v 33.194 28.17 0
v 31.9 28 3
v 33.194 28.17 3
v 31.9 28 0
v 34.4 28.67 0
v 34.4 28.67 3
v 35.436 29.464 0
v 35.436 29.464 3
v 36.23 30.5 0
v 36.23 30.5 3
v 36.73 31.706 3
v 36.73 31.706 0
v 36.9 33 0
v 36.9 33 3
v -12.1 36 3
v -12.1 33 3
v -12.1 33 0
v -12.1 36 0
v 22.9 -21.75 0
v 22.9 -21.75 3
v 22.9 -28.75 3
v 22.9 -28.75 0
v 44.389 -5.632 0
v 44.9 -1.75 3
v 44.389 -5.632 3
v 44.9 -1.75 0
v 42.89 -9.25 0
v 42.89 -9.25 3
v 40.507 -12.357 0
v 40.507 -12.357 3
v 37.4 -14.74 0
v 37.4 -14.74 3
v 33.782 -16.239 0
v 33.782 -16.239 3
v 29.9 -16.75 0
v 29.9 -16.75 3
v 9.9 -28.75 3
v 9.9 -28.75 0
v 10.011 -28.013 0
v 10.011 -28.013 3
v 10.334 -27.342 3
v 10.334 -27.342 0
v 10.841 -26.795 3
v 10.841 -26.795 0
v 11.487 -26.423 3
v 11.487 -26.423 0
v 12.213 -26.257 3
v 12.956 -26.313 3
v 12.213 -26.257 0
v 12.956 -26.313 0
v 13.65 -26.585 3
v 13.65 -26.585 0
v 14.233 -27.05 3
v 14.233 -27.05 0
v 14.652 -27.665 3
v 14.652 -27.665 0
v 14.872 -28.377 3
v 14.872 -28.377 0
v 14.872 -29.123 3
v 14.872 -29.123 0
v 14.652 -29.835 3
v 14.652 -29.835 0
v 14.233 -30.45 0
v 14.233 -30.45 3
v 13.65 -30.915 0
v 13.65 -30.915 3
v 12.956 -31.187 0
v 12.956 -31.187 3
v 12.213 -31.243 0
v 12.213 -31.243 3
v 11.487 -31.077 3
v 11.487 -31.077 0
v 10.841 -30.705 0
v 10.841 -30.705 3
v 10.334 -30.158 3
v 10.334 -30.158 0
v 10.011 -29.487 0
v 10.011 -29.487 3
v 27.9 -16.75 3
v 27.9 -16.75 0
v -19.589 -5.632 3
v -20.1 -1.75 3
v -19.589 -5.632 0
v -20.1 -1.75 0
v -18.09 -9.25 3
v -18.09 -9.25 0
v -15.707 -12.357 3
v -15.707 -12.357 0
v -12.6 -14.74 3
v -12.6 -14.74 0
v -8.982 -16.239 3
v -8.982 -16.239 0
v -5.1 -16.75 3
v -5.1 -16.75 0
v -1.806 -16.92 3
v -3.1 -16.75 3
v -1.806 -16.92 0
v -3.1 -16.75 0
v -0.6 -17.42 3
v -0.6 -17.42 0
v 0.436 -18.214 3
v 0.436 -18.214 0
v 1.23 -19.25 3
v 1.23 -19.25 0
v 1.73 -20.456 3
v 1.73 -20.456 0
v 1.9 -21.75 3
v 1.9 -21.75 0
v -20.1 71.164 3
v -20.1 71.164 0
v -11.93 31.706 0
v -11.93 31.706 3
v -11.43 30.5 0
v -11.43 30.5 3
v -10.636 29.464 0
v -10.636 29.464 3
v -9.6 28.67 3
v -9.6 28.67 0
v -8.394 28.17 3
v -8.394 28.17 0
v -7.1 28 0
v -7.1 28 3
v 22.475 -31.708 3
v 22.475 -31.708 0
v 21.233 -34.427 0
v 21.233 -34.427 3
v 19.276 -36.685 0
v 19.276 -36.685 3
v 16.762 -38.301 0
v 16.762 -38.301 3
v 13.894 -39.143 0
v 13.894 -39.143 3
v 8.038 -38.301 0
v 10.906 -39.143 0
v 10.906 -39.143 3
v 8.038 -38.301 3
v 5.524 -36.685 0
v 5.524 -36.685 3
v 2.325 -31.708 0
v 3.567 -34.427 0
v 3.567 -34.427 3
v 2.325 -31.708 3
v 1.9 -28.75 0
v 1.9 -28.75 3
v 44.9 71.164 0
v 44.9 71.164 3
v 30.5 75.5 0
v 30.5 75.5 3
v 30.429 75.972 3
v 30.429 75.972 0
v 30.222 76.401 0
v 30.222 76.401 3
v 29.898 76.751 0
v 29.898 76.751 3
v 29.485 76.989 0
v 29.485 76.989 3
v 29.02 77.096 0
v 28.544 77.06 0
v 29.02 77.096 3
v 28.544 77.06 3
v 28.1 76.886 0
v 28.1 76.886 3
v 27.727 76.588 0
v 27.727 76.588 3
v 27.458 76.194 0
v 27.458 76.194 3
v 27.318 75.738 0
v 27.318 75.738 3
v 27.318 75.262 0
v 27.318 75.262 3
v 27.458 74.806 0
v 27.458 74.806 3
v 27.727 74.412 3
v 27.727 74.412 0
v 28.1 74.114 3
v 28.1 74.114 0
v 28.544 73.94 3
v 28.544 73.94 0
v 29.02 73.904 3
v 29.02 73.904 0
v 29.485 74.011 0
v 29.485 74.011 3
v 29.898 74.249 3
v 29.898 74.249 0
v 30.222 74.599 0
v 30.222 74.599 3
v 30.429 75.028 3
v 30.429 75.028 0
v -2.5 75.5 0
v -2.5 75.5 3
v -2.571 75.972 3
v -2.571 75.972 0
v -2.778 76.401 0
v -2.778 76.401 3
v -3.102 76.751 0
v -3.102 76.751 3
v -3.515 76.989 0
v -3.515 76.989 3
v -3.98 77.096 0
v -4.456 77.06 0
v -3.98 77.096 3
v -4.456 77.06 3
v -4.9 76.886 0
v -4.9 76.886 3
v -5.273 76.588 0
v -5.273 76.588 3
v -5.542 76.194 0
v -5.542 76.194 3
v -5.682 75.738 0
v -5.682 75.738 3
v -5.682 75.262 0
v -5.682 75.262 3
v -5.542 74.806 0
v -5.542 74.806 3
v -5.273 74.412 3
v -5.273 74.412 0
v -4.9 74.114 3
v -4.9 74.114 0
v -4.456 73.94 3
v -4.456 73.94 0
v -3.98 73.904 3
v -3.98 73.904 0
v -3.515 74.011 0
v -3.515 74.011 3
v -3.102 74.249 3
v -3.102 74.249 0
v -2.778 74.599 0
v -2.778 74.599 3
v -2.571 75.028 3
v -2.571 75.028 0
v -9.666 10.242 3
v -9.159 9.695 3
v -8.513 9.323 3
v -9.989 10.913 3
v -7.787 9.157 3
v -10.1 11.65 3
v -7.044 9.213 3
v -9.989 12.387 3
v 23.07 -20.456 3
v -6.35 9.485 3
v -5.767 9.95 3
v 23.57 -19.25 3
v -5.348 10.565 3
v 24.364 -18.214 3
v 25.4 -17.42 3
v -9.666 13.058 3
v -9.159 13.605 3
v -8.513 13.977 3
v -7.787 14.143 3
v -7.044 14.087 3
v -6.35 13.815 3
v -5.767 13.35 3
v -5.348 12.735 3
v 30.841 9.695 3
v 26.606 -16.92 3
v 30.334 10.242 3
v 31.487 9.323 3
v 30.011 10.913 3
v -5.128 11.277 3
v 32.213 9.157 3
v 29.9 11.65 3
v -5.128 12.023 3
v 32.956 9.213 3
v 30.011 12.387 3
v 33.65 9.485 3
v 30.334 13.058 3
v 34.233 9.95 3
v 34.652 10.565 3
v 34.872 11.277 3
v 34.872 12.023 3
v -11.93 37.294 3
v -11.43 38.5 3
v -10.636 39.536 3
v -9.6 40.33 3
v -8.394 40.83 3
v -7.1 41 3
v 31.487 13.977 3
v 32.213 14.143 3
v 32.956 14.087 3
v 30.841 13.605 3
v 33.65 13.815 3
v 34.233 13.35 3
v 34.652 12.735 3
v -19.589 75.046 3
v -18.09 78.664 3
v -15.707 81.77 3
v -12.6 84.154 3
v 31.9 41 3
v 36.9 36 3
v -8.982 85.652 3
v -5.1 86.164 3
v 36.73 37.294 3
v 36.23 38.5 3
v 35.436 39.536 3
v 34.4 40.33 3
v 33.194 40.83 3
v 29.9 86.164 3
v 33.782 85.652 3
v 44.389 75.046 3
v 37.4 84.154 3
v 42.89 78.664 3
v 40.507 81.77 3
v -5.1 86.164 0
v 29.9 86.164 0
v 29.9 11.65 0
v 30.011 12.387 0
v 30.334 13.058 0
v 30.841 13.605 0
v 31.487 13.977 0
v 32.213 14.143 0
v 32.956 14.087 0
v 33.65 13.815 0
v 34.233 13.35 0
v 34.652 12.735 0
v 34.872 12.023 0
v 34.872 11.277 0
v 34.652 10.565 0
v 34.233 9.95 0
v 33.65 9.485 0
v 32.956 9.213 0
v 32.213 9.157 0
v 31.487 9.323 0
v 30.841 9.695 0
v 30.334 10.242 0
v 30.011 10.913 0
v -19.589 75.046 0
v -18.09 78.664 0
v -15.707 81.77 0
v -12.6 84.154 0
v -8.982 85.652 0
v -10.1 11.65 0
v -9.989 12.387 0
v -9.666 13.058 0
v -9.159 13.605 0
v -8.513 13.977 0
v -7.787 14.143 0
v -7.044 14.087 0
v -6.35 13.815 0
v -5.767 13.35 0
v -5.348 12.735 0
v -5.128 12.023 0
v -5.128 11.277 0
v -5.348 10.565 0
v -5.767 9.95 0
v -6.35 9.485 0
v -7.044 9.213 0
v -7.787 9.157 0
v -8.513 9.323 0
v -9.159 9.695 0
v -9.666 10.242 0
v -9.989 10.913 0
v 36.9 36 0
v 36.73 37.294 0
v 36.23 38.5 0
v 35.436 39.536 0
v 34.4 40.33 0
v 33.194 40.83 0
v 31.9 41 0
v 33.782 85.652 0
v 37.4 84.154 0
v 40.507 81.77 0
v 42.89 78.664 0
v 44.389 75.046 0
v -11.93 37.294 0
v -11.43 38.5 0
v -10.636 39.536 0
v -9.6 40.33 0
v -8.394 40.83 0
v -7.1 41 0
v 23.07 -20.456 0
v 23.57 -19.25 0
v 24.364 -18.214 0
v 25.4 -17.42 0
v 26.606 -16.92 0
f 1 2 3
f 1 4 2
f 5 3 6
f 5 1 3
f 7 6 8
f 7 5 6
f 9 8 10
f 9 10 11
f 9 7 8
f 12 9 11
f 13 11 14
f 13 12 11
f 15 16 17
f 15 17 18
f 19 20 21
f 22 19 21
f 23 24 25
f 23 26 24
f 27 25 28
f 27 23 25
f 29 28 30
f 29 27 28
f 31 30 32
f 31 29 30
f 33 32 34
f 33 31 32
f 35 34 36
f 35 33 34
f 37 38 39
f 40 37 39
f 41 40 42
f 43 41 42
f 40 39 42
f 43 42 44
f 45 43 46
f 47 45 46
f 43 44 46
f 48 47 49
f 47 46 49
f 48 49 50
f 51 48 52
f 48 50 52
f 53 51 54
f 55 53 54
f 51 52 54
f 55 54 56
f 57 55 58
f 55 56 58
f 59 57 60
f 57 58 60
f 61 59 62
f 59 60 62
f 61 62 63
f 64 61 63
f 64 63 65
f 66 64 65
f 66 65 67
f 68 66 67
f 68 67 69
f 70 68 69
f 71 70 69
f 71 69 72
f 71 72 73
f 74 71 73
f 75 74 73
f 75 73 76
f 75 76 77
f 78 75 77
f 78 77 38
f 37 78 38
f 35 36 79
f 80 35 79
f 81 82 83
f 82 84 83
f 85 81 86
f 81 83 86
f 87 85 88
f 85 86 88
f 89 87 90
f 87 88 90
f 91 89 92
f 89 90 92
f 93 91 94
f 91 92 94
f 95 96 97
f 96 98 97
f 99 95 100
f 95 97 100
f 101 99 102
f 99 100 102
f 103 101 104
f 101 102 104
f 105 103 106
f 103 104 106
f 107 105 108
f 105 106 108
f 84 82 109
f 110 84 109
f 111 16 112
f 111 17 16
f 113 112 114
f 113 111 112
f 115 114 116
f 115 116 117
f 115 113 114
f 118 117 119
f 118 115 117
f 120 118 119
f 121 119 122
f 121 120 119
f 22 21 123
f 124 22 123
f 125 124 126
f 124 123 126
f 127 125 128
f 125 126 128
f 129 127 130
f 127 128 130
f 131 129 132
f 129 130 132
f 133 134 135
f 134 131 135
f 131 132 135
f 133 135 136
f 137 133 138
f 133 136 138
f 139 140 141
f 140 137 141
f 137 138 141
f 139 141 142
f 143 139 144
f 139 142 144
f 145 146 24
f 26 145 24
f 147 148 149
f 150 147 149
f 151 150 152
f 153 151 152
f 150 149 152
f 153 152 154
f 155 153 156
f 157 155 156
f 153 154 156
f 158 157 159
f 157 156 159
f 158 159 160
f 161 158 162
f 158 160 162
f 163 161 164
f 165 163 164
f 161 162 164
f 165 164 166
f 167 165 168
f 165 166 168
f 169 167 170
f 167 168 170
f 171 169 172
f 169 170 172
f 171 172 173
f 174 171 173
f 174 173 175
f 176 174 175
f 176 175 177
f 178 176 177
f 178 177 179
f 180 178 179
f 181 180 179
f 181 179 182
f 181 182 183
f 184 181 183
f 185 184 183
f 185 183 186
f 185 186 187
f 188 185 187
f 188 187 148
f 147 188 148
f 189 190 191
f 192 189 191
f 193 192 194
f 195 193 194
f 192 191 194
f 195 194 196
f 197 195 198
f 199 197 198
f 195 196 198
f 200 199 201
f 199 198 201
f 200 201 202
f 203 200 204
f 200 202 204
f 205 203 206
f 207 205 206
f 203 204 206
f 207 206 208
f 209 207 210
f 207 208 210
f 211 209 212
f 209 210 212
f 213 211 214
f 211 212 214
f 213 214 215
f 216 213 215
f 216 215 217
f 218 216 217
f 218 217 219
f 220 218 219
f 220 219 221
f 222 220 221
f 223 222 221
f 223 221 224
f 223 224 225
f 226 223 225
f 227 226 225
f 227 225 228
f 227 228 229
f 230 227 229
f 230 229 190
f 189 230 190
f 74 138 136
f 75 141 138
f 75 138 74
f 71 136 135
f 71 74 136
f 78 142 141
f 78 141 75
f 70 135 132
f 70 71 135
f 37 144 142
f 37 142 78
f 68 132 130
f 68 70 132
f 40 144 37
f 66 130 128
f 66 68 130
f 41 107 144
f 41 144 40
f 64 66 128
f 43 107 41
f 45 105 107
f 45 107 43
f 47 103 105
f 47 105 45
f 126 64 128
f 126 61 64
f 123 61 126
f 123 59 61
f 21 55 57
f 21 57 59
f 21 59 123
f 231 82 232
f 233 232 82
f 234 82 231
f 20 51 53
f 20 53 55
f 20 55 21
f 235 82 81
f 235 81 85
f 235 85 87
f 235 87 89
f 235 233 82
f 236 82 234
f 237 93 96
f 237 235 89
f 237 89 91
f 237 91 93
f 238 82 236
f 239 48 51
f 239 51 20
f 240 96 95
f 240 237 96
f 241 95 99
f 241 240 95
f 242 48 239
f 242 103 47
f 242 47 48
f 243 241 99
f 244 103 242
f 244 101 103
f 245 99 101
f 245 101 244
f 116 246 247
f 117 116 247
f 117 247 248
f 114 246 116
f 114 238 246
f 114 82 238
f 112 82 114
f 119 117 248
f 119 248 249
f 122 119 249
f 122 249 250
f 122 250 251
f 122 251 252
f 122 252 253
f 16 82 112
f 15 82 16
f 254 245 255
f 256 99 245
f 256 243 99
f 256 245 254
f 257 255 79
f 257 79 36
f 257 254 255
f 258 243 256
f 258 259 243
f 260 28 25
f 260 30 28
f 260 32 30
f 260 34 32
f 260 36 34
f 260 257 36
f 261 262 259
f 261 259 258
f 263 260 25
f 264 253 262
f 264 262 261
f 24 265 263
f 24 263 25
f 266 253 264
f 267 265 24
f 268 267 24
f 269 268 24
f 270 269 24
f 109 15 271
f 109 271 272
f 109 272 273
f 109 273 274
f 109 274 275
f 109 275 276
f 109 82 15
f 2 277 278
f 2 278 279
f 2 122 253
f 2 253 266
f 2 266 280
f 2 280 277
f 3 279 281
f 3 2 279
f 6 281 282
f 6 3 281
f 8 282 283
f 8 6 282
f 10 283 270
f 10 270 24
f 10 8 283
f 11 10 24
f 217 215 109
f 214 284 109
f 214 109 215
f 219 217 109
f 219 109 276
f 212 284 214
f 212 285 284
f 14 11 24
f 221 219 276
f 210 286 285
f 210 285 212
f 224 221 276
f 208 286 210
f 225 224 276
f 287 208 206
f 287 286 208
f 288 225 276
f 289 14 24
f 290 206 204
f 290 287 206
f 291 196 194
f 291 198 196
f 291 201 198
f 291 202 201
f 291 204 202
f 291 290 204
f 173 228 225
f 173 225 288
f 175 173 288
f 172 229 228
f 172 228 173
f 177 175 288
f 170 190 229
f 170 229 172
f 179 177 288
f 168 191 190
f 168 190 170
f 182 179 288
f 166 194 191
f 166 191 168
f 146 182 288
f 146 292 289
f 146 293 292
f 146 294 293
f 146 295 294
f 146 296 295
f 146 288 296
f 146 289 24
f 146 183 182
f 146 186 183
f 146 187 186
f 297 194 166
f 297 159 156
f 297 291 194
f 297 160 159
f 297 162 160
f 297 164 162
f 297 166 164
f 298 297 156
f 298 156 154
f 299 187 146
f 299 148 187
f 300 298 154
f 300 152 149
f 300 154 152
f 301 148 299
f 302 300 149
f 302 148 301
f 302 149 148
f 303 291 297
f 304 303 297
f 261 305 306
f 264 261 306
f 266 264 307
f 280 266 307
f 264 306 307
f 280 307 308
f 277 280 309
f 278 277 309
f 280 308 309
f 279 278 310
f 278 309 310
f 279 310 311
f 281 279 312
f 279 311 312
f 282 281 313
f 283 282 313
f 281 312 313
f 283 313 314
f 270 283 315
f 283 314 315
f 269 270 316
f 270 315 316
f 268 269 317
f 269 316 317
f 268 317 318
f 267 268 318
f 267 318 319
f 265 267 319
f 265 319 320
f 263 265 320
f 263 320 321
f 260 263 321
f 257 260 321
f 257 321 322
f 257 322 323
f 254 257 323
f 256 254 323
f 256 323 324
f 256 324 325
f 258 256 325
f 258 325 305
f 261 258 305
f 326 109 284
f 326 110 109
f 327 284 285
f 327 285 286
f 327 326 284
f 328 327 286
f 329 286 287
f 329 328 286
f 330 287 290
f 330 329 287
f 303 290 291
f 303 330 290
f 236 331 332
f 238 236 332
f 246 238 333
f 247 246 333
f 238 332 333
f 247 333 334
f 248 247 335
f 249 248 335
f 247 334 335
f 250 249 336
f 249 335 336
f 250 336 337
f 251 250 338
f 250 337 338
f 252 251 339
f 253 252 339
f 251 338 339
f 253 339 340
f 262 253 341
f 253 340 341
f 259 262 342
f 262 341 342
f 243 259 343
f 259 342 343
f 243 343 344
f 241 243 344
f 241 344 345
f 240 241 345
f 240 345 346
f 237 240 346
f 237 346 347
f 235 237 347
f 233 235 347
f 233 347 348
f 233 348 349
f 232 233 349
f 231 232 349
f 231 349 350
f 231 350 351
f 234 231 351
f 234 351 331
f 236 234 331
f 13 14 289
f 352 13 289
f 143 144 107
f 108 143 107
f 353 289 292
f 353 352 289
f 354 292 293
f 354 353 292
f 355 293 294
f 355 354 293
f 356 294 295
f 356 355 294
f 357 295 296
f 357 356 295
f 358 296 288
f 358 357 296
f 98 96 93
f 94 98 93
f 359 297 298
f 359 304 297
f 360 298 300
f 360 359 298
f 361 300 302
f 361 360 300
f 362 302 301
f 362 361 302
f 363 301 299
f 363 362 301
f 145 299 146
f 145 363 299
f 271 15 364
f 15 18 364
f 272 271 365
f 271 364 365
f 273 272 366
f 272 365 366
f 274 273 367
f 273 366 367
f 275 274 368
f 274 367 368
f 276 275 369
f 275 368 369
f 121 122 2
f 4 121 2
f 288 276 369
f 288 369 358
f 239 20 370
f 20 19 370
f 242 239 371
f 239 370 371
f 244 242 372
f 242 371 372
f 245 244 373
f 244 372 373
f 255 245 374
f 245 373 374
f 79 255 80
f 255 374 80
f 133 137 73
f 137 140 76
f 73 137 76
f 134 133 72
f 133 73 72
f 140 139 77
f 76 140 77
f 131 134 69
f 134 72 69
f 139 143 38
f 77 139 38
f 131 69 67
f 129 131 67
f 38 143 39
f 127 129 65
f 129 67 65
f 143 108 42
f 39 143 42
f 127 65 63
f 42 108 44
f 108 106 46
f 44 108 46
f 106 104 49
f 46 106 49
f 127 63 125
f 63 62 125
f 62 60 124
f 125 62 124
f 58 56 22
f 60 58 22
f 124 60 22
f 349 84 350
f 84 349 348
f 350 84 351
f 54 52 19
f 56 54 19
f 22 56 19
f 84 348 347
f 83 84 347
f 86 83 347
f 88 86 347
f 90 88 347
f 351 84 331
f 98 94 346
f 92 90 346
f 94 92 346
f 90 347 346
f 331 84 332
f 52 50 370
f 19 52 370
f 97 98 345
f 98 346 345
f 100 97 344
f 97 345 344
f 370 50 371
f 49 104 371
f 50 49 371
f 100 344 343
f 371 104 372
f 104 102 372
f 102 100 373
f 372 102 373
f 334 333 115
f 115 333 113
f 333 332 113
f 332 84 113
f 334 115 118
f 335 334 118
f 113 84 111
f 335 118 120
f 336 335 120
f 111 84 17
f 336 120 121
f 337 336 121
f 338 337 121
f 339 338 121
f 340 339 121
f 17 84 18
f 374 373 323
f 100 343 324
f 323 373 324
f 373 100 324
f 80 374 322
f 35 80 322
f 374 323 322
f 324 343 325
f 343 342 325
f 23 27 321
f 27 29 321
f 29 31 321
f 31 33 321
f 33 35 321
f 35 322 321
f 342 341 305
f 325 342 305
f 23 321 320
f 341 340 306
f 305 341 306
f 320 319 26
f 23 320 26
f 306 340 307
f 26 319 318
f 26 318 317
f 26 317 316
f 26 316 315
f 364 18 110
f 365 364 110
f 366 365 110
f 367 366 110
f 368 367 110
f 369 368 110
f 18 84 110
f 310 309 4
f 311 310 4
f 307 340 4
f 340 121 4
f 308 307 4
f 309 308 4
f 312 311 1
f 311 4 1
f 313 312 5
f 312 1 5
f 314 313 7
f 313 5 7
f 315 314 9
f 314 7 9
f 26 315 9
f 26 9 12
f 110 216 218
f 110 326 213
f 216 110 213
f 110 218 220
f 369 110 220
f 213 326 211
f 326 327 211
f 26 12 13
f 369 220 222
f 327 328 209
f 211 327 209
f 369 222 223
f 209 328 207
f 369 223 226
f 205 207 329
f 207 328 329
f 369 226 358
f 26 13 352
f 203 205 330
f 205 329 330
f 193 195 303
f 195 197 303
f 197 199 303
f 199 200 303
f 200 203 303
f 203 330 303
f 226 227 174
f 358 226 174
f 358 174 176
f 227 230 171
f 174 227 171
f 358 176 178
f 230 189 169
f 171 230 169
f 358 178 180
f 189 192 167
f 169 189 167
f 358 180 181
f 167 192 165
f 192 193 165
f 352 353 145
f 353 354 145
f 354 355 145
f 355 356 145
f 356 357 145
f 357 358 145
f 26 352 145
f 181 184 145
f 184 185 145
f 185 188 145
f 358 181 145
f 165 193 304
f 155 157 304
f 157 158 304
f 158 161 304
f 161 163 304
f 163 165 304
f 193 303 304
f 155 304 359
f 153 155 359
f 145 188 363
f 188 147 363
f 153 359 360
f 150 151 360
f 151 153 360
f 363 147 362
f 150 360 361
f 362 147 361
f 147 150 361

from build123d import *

# Parameters (mm, degrees)
SKETCH2_W           = 200
SKETCH2_H           = 200
BOSS_EXTRUDE1_DEPTH = 3
SKETCH3_R           = 2.5
CUT_EXTRUDE1_DEPTH  = 10
CUT_EXTRUDE2_REACH  = 143.453
SKETCH4_W           = 200
SKETCH4_H           = 200
SKETCH4_W_2         = 49
SKETCH4_H_2         = 13
FILLET1_R           = 15
FILLET2_R           = 5
CUT_EXTRUDE4_REACH  = 99.207
SKETCH6_R           = 1.6


with BuildPart() as part:
    # Sketch2 → Boss-Extrude1 (new body)
    with BuildSketch(Plane.XY):
        Rectangle(SKETCH2_W, SKETCH2_H)
    extrude(amount=BOSS_EXTRUDE1_DEPTH)

    # Sketch3 → Cut-Extrude1 (cut)
    with BuildSketch(Plane(origin=(0, 0, 0), x_dir=(-1, 0, 0), z_dir=(0, 0, -1))):
        with Locations((-32.4, 11.65)):
            Circle(SKETCH3_R)
        with Locations((7.6, 11.65)):
            Circle(SKETCH3_R)
        with Locations((-12.4, -28.75)):
            Circle(SKETCH3_R)
    extrude(amount=-CUT_EXTRUDE1_DEPTH, mode=Mode.SUBTRACT)

    # Sketch4 → Cut-Extrude2 (cut, up to next)
    with BuildSketch(Plane.XY.offset(3), mode=Mode.PRIVATE) as cut_extrude2_sk1:
        Rectangle(SKETCH4_W, SKETCH4_H)
        with BuildLine():
            Line((-20.1, -16.75), (-20.1, 86.163533864))
            Line((-20.1, 86.163533864), (44.9, 86.163533864))
            Line((44.9, 86.163533864), (44.9, -16.75))
            Line((44.9, -16.75), (22.9, -16.75))
            Line((22.9, -16.75), (22.9, -28.75))
            ThreePointArc((22.9, -28.75), (12.4, -39.25), (1.9, -28.75))
            Line((1.9, -28.75), (1.9, -16.75))
            Line((1.9, -16.75), (-20.1, -16.75))
        make_face(mode=Mode.SUBTRACT)
    cut_extrude2_tool1 = extrude(cut_extrude2_sk1.sketch, amount=-CUT_EXTRUDE2_REACH, mode=Mode.PRIVATE) & part.part
    # Sketch4 → Cut-Extrude2 (cut, up to next)
    with BuildSketch(Plane.XY.offset(3), mode=Mode.PRIVATE) as cut_extrude2_sk2:
        with Locations((12.4, 34.5)):
            Rectangle(SKETCH4_W_2, SKETCH4_H_2)
    cut_extrude2_tool2 = extrude(cut_extrude2_sk2.sketch, amount=-CUT_EXTRUDE2_REACH, mode=Mode.PRIVATE) & part.part
    add(cut_extrude2_tool1.solids().sort_by_distance((-97.171573, 0, 3))[0], mode=Mode.SUBTRACT)
    add(cut_extrude2_tool2.solids().sort_by_distance((12.4, 34.5, 3))[0], mode=Mode.SUBTRACT)

    # Fillet1
    fillet1_edges = [part.edges().sort_by_distance(p)[0] for p in [
        (-20.1, -16.75, 1.5),
        (44.9, -16.75, 1.5),
        (-20.1, 86.163533864, 1.5),
        (44.9, 86.163533864, 1.5),
    ]]
    fillet(fillet1_edges, radius=FILLET1_R)

    # Fillet2
    fillet2_edges = [part.edges().sort_by_distance(p)[0] for p in [
        (-12.1, 41, 1.5),
        (-12.1, 28, 1.5),
        (36.9, 41, 1.5),
        (36.9, 28, 1.5),
        (1.9, -16.75, 1.5),
        (22.9, -16.75, 1.5),
    ]]
    fillet(fillet2_edges, radius=FILLET2_R)

    # Sketch6 → Cut-Extrude4 (cut, up to next)
    with BuildSketch(Plane.XY.offset(3), mode=Mode.PRIVATE) as cut_extrude4_sk1:
        with Locations((-4.1, 75.5)):
            Circle(SKETCH6_R)
    cut_extrude4_tool1 = extrude(cut_extrude4_sk1.sketch, amount=-CUT_EXTRUDE4_REACH, mode=Mode.PRIVATE) & part.part
    # Sketch6 → Cut-Extrude4 (cut, up to next)
    with BuildSketch(Plane.XY.offset(3), mode=Mode.PRIVATE) as cut_extrude4_sk2:
        with Locations((28.9, 75.5)):
            Circle(SKETCH6_R)
    cut_extrude4_tool2 = extrude(cut_extrude4_sk2.sketch, amount=-CUT_EXTRUDE4_REACH, mode=Mode.PRIVATE) & part.part
    add(cut_extrude4_tool1.solids().sort_by_distance((-4.1, 75.5, 3))[0], mode=Mode.SUBTRACT)
    add(cut_extrude4_tool2.solids().sort_by_distance((28.9, 75.5, 3))[0], mode=Mode.SUBTRACT)


solid = part.part
